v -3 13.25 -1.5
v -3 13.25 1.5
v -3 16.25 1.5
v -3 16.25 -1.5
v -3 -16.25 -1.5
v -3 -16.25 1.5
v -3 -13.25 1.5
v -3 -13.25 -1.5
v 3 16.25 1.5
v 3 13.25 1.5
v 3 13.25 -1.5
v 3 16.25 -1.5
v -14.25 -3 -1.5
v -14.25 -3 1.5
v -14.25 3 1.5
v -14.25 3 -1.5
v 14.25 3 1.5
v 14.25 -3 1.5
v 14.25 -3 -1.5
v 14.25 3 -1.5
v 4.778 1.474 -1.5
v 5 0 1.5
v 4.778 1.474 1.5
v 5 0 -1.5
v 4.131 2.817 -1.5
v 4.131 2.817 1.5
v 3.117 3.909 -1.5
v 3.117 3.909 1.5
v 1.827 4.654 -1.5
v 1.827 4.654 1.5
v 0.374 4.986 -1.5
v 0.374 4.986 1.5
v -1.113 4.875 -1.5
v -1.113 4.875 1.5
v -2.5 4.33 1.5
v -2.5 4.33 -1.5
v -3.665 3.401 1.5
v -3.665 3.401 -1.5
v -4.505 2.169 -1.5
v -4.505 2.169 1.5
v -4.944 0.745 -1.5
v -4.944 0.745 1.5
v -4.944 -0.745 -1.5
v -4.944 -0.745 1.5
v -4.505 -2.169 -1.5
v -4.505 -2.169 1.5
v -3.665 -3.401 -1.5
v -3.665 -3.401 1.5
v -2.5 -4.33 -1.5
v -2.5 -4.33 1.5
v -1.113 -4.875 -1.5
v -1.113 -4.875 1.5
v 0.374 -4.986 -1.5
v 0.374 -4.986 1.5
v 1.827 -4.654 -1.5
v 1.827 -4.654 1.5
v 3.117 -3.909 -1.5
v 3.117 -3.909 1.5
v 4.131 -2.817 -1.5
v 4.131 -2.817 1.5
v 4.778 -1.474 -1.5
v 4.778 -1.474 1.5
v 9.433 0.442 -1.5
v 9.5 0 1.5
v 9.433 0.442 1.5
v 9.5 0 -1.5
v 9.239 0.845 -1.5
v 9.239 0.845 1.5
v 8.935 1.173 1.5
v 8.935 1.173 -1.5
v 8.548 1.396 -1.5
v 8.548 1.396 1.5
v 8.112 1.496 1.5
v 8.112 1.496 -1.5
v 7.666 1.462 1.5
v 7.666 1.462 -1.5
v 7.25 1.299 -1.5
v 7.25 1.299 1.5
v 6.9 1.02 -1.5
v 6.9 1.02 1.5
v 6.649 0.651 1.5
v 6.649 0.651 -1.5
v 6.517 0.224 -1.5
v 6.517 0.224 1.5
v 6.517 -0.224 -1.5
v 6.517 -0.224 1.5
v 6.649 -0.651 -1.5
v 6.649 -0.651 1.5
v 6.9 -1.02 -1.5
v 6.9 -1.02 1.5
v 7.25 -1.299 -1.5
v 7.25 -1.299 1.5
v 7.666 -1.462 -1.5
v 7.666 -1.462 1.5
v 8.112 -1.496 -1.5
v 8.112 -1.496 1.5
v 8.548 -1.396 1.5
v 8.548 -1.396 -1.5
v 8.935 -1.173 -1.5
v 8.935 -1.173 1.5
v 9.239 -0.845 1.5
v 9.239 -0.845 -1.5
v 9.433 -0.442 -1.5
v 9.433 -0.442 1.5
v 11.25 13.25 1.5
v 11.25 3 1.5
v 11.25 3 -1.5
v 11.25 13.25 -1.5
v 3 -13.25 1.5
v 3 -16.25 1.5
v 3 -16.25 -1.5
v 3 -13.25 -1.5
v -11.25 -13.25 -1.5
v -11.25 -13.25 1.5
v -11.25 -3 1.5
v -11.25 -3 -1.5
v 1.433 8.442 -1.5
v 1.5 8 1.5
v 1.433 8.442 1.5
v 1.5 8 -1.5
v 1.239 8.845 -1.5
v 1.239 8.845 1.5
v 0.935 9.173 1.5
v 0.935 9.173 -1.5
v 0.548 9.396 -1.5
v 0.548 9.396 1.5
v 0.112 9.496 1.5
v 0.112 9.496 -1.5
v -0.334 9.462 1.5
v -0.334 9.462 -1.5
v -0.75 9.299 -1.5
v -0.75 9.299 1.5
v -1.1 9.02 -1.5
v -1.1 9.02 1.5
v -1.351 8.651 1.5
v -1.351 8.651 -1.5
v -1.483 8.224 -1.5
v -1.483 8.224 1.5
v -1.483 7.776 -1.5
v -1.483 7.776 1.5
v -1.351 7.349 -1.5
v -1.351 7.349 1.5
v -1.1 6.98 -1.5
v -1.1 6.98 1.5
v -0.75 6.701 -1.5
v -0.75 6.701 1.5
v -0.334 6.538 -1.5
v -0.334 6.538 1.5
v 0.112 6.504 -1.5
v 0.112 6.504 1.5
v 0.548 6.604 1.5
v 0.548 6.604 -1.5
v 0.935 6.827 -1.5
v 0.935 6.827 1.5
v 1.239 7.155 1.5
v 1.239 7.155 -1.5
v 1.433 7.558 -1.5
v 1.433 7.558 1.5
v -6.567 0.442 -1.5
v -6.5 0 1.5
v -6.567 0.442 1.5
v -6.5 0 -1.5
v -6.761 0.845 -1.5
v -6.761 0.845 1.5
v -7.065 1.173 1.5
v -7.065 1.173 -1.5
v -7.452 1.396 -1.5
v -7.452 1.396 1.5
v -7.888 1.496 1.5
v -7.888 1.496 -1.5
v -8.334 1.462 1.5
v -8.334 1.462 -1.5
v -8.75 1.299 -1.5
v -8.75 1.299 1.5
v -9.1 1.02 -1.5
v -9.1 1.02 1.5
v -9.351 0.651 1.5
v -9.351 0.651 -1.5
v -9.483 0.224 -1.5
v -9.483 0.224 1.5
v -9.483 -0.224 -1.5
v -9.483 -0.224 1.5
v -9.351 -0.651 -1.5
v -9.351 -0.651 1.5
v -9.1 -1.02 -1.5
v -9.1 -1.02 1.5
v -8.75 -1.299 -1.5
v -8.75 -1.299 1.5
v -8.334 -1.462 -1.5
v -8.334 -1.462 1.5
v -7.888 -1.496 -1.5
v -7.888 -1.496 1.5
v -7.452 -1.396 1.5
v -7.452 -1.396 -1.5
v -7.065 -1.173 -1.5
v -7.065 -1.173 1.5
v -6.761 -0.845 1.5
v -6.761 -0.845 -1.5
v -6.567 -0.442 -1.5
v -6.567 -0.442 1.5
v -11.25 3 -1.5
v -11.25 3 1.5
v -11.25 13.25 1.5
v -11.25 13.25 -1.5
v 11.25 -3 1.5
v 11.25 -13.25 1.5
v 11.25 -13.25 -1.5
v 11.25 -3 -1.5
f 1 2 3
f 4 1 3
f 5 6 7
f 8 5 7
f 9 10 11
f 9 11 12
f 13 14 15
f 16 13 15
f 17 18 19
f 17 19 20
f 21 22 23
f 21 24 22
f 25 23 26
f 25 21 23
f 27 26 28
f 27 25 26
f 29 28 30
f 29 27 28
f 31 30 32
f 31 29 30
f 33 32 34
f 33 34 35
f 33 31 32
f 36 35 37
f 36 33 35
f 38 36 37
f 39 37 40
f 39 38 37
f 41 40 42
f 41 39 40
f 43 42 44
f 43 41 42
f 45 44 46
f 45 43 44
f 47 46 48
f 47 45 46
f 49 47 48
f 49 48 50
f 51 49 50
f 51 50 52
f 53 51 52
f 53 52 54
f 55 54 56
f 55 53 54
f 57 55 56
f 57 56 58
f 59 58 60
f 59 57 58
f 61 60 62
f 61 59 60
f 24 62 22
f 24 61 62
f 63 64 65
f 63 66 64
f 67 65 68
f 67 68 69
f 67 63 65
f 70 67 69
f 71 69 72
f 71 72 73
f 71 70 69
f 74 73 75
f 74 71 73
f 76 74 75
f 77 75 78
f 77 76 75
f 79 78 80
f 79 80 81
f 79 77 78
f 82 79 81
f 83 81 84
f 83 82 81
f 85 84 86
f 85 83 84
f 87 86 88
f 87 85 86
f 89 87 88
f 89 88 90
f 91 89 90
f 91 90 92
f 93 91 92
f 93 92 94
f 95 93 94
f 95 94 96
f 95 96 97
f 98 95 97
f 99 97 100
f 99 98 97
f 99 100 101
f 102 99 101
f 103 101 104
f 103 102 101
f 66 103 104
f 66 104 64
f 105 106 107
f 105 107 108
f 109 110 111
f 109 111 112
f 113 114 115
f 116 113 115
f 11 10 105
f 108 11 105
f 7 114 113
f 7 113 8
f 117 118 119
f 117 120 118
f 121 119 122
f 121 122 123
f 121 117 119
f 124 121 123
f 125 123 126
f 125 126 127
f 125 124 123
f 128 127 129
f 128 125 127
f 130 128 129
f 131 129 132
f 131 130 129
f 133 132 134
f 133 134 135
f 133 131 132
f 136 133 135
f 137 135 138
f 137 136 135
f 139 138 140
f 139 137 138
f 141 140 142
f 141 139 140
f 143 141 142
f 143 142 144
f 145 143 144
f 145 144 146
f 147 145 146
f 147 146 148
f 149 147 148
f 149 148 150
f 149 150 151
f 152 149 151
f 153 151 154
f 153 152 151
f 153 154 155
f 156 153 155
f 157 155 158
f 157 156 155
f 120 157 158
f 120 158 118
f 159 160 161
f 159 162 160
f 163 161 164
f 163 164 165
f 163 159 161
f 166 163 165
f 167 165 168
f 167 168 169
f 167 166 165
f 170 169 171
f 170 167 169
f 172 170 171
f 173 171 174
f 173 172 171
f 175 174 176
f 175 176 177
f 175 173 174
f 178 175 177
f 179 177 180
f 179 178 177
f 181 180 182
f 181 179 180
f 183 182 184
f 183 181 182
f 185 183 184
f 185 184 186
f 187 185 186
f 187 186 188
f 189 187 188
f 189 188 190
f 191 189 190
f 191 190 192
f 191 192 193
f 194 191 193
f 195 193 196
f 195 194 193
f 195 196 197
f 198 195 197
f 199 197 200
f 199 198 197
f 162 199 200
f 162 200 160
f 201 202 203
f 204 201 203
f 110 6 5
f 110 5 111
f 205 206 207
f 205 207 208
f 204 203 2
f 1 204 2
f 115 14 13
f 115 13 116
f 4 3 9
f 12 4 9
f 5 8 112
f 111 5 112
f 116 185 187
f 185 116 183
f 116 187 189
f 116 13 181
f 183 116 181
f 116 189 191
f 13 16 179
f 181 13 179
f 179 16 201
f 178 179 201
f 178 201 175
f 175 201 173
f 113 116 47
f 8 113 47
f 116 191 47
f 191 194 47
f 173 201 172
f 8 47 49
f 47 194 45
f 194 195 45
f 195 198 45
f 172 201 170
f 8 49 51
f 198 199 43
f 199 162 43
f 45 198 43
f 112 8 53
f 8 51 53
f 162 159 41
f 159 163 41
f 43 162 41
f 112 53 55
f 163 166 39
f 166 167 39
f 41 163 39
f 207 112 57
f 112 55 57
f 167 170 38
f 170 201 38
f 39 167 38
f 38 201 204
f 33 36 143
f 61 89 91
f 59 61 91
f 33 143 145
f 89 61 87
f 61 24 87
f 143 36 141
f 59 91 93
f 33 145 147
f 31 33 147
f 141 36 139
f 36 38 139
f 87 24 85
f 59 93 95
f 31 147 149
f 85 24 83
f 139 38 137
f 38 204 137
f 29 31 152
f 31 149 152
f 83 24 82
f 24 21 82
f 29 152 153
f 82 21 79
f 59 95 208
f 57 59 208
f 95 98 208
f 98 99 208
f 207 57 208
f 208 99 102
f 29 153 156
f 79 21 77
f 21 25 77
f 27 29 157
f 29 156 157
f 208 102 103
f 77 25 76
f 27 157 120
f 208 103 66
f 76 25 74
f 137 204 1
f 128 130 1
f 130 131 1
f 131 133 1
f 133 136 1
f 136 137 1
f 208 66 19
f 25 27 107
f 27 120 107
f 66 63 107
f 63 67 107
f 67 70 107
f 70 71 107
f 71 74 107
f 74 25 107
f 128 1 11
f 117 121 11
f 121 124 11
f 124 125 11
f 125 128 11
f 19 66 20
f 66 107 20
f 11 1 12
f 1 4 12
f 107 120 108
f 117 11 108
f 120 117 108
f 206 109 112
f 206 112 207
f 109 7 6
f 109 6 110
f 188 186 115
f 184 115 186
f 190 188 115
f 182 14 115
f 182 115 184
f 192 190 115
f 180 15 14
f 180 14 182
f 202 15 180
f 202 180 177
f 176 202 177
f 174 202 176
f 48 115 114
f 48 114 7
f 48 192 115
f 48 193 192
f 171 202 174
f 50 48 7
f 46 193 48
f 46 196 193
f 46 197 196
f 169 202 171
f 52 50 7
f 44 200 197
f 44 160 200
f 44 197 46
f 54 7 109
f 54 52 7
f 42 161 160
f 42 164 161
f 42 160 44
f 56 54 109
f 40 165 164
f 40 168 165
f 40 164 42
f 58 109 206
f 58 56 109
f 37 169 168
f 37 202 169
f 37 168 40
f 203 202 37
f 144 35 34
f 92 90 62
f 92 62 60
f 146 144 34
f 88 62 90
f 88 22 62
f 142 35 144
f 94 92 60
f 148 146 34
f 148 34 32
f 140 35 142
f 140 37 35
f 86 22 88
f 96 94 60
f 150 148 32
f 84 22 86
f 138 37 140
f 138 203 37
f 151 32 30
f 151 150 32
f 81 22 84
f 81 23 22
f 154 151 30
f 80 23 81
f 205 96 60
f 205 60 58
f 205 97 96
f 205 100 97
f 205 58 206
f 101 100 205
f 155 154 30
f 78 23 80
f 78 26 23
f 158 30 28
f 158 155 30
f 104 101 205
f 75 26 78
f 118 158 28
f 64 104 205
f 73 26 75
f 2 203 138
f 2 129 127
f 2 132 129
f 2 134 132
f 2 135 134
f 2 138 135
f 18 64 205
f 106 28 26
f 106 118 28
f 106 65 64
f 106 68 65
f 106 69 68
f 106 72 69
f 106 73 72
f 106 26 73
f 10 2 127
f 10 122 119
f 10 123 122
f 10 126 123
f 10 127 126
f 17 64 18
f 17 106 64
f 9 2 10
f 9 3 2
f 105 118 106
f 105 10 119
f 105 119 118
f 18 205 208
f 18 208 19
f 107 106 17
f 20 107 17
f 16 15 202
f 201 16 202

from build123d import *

# Parameters (mm, degrees)
SKETCH_W     = 22.5
SKETCH_H     = 26.5
SKETCH_R     = 5
SKETCH_R_2   = 1.5
PAD_DEPTH    = 1.5
SKETCH017_W  = 6
SKETCH017_H  = 3
PAD005_DEPTH = 3
SKETCH018_W  = 3
SKETCH018_H  = 6
PAD006_DEPTH = 3


with BuildPart() as part:
    # Sketch → Pad (new body, symmetric)
    with BuildSketch(Plane.XY):
        Rectangle(SKETCH_W, SKETCH_H)
        Circle(SKETCH_R, mode=Mode.SUBTRACT)
        with Locations((0, 8)):
            Circle(SKETCH_R_2, mode=Mode.SUBTRACT)
        with Locations((8, 0)):
            Circle(SKETCH_R_2, mode=Mode.SUBTRACT)
        with Locations((-8, 0)):
            Circle(SKETCH_R_2, mode=Mode.SUBTRACT)
    extrude(amount=PAD_DEPTH, both=True)

    # Sketch017 (on Face10 of Pad) → Pad005 (join)
    with BuildSketch(Plane.XY.offset(1.5)):
        with Locations((0, 14.75)):
            Rectangle(SKETCH017_W, SKETCH017_H)
        with Locations((0, -14.75)):
            Rectangle(SKETCH017_W, SKETCH017_H)
    extrude(amount=-PAD005_DEPTH)

    # Sketch018 (on Face18 of Pad005) → Pad006 (join)
    with BuildSketch(Plane.XY.offset(1.5)):
        with Locations((-12.75, 0)):
            Rectangle(SKETCH018_W, SKETCH018_H)
        with Locations((12.75, 0)):
            Rectangle(SKETCH018_W, SKETCH018_H)
    extrude(amount=-PAD006_DEPTH)


solid = part.part
